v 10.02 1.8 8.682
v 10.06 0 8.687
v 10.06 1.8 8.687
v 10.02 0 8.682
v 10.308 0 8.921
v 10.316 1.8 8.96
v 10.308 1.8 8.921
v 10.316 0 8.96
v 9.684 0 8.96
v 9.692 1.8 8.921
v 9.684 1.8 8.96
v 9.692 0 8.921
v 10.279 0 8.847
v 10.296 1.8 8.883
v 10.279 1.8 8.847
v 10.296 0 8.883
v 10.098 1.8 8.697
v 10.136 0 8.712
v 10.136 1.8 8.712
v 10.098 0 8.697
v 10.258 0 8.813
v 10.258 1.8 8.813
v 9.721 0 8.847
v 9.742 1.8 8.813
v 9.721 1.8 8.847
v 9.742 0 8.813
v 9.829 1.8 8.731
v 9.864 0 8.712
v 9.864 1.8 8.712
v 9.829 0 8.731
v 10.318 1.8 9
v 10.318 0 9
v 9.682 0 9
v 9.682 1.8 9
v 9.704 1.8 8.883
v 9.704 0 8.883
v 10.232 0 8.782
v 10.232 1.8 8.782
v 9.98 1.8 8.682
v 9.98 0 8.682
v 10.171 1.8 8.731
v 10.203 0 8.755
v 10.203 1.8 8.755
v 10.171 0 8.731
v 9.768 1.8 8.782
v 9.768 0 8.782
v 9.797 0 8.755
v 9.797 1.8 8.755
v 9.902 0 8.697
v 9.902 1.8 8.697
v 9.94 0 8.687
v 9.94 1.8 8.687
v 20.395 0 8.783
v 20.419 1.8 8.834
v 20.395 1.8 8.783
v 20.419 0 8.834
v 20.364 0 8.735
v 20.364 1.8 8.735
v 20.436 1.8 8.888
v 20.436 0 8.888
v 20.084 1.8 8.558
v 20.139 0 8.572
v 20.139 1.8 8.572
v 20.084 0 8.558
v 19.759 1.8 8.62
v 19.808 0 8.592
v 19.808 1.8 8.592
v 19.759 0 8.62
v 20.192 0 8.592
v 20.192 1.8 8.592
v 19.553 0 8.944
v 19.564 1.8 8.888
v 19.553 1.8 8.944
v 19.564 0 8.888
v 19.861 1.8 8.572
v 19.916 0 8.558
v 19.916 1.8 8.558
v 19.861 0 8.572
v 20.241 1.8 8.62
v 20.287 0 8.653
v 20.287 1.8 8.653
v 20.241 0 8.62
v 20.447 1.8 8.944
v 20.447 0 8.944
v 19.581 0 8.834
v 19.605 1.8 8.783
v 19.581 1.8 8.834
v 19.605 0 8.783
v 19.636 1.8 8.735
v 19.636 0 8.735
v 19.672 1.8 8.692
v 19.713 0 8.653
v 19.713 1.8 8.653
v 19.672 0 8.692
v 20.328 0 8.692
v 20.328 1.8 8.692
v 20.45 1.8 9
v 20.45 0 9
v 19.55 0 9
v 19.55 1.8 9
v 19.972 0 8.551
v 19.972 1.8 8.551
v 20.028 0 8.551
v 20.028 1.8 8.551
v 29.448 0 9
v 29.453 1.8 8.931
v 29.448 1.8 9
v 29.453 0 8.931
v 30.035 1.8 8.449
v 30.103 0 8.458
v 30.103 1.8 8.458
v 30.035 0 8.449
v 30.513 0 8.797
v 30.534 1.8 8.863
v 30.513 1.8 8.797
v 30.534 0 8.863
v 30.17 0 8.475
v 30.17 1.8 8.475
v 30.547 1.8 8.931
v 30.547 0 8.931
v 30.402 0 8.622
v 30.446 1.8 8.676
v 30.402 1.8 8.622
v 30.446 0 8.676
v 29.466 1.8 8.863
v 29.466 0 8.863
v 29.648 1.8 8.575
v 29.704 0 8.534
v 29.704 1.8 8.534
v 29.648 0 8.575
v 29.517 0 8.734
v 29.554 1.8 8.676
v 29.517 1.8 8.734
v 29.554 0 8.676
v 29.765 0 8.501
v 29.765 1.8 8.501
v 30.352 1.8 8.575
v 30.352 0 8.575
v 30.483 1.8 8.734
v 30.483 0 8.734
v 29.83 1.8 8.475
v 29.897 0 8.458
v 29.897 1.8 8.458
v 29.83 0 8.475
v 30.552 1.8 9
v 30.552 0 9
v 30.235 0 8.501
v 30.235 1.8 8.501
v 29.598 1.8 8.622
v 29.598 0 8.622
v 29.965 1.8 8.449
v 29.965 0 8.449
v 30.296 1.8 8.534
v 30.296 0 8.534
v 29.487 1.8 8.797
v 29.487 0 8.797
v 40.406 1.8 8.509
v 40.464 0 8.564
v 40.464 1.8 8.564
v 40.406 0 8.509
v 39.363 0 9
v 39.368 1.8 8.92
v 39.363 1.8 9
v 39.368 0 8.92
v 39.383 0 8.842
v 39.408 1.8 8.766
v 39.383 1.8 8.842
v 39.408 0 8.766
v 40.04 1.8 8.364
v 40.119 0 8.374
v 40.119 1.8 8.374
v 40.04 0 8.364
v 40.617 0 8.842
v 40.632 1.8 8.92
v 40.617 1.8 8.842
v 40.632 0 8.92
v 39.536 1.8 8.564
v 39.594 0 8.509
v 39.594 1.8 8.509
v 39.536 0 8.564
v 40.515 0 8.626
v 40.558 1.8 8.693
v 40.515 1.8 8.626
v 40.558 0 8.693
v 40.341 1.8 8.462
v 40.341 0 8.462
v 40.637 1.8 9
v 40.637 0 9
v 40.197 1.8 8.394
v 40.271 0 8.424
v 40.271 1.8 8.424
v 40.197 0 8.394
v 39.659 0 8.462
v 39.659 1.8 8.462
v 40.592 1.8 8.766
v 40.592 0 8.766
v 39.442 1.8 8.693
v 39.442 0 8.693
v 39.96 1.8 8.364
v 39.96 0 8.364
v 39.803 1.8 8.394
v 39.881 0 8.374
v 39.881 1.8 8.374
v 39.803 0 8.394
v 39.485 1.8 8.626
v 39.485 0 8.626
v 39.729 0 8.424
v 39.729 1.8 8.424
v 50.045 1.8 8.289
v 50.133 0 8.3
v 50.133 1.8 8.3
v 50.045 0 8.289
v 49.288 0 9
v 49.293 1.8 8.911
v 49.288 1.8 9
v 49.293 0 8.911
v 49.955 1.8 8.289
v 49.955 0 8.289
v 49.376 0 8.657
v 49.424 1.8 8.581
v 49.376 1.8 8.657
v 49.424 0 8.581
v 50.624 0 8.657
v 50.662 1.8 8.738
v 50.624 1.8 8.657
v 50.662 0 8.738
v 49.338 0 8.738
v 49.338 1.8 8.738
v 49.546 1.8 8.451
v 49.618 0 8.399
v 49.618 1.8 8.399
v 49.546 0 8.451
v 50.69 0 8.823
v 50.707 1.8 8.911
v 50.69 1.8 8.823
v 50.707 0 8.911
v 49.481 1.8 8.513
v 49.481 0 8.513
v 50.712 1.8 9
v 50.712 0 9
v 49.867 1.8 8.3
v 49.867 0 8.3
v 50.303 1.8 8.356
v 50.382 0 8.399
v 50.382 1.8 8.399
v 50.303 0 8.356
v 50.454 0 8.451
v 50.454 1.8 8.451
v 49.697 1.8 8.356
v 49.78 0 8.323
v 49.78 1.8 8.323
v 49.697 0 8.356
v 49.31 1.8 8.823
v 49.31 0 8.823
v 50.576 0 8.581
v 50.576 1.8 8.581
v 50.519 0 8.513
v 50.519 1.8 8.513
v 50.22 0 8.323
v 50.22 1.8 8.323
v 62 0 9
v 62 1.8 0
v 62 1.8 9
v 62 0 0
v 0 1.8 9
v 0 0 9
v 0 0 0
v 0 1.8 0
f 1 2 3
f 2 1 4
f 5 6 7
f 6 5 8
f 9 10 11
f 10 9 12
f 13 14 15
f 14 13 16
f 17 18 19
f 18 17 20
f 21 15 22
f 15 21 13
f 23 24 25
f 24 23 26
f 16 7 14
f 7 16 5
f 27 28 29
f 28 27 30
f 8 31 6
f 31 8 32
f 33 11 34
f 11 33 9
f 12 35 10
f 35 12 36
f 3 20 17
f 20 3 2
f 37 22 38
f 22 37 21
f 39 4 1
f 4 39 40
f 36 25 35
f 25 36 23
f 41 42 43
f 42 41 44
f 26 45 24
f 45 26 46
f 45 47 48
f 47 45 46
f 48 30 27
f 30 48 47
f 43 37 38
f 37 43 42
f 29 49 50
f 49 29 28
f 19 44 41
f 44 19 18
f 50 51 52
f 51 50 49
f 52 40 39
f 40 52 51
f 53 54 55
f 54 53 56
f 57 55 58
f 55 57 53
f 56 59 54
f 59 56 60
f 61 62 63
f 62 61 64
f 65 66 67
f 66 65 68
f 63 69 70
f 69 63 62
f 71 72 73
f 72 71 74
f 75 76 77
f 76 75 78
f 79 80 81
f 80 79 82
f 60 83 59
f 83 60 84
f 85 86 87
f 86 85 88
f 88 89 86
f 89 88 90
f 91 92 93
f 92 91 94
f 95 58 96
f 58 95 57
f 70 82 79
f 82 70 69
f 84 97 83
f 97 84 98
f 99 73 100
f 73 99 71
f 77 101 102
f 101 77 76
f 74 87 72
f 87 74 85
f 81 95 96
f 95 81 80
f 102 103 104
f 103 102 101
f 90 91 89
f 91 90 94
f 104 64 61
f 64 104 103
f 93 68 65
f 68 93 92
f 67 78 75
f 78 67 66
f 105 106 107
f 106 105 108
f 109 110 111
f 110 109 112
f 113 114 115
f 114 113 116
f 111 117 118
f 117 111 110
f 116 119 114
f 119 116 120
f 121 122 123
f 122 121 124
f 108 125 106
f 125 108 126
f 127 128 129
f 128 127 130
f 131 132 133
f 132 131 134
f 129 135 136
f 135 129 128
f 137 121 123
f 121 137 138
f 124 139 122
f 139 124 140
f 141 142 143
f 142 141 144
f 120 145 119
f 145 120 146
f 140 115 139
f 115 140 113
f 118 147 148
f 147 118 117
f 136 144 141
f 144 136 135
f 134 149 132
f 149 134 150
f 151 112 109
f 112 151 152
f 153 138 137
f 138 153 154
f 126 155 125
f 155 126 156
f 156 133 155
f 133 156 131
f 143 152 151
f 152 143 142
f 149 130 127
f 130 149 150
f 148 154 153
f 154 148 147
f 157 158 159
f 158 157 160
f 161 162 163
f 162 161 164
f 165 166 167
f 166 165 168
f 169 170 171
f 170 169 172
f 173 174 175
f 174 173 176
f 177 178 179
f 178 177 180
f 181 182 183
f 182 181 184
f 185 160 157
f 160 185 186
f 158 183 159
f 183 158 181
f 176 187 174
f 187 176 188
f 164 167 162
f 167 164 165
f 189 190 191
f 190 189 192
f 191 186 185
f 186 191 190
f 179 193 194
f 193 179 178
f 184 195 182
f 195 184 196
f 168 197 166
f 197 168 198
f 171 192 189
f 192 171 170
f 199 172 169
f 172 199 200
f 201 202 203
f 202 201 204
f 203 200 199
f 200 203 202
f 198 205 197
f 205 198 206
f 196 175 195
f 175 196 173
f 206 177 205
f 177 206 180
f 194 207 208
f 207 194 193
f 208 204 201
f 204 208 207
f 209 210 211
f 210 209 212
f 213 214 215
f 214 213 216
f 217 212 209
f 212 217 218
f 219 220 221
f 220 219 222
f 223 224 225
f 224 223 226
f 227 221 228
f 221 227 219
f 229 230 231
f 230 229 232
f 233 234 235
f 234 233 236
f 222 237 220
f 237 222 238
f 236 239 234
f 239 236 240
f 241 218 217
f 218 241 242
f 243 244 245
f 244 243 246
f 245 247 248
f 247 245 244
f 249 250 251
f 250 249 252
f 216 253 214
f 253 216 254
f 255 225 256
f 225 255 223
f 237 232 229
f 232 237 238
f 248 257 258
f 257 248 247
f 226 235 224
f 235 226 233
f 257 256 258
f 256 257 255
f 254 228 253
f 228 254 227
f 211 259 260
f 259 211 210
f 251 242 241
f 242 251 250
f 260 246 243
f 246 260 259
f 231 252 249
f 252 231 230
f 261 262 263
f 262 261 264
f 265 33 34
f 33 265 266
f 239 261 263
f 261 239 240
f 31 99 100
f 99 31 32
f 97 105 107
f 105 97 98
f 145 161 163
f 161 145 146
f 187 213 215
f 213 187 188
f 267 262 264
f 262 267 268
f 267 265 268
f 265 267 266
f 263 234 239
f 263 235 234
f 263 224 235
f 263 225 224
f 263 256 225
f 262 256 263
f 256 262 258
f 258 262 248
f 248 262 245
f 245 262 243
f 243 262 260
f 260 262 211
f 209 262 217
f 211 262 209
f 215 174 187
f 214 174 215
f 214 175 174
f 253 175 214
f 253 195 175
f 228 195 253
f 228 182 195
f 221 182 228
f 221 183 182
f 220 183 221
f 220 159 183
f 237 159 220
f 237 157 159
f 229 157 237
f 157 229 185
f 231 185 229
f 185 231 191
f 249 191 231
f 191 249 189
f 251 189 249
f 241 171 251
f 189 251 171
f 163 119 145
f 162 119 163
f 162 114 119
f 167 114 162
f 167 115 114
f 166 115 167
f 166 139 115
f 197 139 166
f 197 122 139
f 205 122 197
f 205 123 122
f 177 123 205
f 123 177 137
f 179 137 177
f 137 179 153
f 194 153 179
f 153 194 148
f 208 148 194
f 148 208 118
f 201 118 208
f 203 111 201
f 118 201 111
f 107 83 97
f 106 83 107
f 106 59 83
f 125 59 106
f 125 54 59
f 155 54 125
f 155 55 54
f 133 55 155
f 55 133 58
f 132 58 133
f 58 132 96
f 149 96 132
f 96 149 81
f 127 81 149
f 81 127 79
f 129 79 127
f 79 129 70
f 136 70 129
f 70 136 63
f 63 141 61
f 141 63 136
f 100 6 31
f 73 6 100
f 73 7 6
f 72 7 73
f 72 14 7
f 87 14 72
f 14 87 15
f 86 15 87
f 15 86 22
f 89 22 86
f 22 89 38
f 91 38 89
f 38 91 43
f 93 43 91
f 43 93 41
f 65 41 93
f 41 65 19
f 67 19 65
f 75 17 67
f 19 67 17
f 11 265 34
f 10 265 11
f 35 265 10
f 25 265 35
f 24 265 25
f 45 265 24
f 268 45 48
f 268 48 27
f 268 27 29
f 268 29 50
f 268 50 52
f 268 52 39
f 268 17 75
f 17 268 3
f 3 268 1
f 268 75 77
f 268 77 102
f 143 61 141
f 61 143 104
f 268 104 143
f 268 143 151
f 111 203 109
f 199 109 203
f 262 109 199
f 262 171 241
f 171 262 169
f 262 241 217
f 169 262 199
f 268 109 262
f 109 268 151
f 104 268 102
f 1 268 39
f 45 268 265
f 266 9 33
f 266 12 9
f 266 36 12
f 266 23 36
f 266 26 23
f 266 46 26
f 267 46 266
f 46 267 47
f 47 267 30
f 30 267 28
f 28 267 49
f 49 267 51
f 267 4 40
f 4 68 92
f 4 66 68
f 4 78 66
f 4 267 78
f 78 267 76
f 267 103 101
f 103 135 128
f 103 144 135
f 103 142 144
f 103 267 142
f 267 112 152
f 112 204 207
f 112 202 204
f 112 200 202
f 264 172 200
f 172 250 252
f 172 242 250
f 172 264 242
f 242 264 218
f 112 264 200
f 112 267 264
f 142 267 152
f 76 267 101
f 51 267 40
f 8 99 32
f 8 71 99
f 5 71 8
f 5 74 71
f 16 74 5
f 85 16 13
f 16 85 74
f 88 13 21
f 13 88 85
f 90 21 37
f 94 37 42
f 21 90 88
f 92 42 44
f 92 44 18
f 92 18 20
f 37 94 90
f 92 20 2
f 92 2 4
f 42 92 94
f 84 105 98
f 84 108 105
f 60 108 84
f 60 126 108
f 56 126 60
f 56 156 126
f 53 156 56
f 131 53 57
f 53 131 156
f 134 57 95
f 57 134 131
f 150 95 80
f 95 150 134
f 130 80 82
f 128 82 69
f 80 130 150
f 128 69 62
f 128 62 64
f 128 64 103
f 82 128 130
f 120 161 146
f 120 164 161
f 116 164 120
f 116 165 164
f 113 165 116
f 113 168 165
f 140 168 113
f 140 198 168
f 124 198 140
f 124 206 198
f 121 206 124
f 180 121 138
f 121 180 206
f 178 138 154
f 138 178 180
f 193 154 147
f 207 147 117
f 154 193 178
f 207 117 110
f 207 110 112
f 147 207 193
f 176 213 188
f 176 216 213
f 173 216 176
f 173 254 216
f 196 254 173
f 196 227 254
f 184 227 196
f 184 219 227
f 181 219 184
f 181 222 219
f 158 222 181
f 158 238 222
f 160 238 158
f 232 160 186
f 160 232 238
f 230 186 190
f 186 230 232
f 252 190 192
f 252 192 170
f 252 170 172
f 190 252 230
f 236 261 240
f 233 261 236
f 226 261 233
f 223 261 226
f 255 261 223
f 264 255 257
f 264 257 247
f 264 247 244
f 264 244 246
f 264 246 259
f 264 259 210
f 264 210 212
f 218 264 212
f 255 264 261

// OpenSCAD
// nut 
$fn = 50;

s = 5; // number of strings
h = 9; // nut height 

difference() {
    cube( size=[62,1.8,h] ); 
    for ( i=[1:s] ) {
        translate( [10*i,2,h] ) {
            rotate( [90,0,0] ) {
                cylinder( r=sqrt(i)/3.14, h=3);
            }
        }
    }
}
